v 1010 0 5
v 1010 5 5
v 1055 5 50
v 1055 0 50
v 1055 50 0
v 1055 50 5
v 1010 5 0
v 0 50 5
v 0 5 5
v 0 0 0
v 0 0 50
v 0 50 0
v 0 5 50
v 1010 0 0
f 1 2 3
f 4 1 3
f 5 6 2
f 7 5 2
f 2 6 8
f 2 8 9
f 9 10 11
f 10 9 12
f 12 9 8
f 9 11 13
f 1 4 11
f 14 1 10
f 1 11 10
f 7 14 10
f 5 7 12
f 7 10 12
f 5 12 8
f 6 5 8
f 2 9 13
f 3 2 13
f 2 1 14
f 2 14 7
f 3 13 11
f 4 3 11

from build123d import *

# Parameters (mm, degrees)
F1_DEPTH = 1055
F4_DEPTH = 5
F5_DEPTH = 25
F6_DEPTH = 45


with BuildPart() as f1:
    # F0 (on Right) → F1 (new body)
    with BuildSketch(Plane.YZ):
        Polygon((0, 50), (0, 0), (50, 0), (50, 5), (5, 5), (5, 50), align=None)
    extrude(amount=F1_DEPTH)

    # F3 (on face) → F4 (cut)
    with BuildSketch(Plane.XY.offset(5)):
        Polygon((1055, 5), (1055, 50), (1010, 5), align=None)
    extrude(amount=-F4_DEPTH, mode=Mode.SUBTRACT)

    # F2 (on face) → F5 (cut)
    with BuildSketch(Plane(origin=(0, 5, 0), x_dir=(-1, 0, 0), z_dir=(0, 1, 0))):
        Polygon((-1055, 5), (-1010, 5), (-1055, 50), align=None)
    extrude(amount=-F5_DEPTH, mode=Mode.SUBTRACT)

    # F6 (cut): a face of the model
    f6_faces = [f1.faces().sort_by_distance(p)[0] for p in [
        (1055, 2.5, 2.5),
    ]]
    extrude(f6_faces, amount=-F6_DEPTH, mode=Mode.SUBTRACT)


solid = f1.part
